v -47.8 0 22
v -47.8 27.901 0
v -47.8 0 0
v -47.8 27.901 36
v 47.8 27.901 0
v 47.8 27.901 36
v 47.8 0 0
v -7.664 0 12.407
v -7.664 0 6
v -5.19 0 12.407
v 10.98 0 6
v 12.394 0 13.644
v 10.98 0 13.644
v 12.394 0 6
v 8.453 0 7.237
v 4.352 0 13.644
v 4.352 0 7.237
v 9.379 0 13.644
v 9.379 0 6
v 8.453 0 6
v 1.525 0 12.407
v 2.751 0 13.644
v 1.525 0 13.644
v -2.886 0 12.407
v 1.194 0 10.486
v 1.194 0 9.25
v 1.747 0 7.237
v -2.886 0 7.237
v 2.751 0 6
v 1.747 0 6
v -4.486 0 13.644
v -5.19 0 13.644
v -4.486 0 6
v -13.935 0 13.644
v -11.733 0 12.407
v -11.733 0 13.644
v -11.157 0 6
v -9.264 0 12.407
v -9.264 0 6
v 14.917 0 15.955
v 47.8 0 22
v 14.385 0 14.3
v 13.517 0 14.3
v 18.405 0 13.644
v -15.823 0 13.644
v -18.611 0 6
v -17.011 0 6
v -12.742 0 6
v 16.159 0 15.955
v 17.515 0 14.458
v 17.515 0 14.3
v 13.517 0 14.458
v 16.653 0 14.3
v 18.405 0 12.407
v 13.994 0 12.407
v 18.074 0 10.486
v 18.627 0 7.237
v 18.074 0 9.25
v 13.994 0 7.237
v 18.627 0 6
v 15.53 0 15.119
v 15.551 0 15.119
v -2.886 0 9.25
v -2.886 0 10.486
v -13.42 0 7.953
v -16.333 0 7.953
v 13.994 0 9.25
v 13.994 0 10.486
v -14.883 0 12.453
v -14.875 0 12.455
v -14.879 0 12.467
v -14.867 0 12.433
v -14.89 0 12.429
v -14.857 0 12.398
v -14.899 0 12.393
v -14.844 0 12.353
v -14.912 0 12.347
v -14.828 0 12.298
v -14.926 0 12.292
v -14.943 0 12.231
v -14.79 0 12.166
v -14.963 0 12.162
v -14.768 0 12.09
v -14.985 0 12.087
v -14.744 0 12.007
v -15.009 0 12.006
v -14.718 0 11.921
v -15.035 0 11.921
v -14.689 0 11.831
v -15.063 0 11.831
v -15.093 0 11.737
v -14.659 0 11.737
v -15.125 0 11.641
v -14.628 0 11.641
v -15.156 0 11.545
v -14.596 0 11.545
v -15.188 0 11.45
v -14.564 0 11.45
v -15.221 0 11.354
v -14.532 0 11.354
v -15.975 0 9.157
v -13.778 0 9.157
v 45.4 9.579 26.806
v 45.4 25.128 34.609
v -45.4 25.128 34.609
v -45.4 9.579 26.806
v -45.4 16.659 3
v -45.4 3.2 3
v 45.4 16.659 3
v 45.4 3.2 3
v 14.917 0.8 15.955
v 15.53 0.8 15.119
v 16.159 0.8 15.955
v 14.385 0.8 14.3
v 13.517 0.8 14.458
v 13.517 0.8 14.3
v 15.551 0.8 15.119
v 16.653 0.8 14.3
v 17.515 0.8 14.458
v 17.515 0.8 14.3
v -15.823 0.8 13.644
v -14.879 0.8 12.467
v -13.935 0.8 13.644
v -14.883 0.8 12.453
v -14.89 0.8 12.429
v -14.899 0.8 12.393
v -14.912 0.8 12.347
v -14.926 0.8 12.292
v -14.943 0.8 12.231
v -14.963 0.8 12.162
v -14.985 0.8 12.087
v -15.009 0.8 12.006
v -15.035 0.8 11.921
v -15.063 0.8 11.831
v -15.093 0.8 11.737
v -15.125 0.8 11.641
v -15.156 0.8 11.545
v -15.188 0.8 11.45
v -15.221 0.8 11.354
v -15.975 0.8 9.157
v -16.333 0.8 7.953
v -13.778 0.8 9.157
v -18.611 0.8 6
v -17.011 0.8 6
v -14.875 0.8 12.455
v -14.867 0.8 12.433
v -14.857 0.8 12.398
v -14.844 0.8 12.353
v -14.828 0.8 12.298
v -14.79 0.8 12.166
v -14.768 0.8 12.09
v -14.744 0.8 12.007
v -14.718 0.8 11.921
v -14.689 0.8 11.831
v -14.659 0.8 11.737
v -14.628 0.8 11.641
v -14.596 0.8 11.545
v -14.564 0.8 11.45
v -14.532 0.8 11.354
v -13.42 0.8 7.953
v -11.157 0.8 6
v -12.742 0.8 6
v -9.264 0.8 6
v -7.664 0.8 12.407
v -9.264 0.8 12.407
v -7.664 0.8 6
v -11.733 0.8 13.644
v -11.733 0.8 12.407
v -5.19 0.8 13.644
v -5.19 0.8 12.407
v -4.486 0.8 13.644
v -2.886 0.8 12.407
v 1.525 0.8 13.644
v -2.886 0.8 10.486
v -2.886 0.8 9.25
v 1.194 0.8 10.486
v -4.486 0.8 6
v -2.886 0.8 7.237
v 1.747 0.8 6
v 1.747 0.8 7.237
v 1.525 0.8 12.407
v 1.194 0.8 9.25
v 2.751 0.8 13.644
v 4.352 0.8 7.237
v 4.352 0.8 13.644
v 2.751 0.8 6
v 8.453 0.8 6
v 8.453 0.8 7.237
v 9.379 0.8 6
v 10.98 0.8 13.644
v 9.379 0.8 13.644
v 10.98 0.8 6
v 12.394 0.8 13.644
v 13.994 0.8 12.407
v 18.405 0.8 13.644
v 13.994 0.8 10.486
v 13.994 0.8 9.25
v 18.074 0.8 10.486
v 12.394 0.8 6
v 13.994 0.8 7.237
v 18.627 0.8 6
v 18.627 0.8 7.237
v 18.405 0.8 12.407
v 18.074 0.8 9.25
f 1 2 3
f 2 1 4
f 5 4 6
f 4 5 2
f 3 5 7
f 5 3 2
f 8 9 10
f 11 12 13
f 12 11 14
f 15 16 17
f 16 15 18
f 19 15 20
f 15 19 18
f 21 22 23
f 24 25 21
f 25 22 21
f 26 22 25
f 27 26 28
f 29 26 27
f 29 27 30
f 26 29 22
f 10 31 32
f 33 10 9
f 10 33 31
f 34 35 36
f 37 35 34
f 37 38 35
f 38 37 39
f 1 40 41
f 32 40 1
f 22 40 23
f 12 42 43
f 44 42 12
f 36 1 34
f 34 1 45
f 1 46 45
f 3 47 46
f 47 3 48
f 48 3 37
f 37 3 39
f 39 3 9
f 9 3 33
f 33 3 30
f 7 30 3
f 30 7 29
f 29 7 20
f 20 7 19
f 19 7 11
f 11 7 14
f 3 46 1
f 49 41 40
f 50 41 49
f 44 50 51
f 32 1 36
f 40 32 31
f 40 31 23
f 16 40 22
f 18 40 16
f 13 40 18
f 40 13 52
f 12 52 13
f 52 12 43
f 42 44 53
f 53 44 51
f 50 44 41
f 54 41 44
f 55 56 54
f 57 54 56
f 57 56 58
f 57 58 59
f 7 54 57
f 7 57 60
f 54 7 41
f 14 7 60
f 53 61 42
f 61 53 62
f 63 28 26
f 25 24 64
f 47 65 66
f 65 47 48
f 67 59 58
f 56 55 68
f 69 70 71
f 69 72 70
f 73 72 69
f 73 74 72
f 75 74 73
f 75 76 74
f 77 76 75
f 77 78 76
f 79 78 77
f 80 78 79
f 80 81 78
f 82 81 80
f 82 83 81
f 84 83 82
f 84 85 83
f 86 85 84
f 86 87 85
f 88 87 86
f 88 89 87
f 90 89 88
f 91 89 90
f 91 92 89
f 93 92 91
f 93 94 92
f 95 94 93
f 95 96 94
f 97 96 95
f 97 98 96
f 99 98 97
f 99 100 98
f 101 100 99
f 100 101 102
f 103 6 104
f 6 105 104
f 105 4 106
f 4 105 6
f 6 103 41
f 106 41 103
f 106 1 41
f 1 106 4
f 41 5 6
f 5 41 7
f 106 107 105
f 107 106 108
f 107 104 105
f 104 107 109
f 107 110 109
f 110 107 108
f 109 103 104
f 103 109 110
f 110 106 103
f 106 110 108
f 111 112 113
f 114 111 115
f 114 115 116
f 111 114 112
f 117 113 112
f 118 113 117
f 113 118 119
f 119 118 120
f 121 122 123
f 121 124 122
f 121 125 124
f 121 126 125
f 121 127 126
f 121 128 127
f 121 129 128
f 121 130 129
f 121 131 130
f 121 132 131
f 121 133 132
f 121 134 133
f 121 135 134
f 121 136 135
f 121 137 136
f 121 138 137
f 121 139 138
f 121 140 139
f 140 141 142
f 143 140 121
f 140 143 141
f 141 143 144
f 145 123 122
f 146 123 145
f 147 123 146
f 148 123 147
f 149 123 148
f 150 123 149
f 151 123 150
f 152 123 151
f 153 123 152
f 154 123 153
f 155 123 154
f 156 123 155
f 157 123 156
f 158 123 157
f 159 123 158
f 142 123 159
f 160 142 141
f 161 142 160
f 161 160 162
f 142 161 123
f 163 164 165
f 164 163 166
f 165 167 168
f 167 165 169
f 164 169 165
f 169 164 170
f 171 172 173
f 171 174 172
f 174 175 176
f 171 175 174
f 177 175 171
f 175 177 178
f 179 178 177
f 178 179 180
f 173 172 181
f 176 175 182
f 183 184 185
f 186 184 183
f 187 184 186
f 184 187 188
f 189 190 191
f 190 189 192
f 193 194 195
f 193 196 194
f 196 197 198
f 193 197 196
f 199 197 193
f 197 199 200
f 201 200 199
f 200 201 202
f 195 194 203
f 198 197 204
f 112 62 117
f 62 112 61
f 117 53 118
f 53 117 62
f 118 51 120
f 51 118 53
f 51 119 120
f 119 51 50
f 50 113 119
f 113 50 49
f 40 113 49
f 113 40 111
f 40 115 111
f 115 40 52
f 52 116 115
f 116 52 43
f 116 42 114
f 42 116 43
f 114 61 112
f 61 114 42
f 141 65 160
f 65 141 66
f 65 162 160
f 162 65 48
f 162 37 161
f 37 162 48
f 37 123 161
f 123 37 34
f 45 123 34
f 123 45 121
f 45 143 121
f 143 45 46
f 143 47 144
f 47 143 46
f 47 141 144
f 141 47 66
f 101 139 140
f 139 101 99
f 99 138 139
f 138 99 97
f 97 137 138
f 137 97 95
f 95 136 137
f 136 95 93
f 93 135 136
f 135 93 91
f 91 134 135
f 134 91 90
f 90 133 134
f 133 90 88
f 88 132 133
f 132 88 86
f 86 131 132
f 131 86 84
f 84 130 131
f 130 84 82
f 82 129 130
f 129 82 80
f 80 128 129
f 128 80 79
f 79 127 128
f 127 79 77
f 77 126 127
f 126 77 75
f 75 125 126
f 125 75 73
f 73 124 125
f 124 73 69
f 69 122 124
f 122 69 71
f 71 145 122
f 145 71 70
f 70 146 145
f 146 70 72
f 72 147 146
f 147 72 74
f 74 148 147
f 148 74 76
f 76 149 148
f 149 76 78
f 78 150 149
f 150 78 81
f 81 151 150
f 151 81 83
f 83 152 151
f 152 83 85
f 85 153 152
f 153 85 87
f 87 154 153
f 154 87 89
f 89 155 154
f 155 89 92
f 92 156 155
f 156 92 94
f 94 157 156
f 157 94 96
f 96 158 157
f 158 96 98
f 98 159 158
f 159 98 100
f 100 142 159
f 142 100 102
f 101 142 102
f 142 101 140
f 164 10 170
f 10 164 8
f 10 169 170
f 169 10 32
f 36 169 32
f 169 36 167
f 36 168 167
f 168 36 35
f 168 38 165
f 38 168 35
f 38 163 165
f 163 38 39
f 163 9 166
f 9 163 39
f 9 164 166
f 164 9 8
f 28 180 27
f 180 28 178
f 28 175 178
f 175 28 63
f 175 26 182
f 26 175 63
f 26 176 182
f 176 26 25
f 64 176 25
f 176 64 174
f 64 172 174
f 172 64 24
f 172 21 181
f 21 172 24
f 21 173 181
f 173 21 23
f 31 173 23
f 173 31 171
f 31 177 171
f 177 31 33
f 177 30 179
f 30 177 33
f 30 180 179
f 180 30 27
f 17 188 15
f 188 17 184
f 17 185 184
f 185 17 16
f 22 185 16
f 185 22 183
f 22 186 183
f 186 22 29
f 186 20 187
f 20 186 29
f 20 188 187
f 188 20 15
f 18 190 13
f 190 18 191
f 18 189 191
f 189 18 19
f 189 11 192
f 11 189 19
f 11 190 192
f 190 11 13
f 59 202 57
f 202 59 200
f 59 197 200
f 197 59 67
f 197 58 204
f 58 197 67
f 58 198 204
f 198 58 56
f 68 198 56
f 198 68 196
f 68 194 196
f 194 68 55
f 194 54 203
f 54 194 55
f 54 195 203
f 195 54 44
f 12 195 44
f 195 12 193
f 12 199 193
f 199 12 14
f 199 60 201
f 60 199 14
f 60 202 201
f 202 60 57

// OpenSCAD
card_w   = 90;
card_h   = 50;
stack_t  = 12;
clear_w  = 0.8;
clear_t  = 1.0;
wall     = 2.4;
floor_t  = 3;
tilt     = 15;
engrave  = 0.8;
front_t  = 3.2;
front_h  = 22;
back_h   = 36;
txt      = "ATELIÊ";
txt_size = 8;
txt_z    = 6;
slot_w   = card_w + clear_w;
slot_t   = stack_t + clear_t;
slot_dy  = slot_t / cos(tilt);
tt       = tan(tilt);
body_w   = slot_w + 2*wall;
back_in  = front_t + slot_dy + (back_h - floor_t)*tt;
body_d   = back_in + wall;
top_cut  = back_h + 1;
module profile() {
    polygon([[0,0],[body_d,0],[body_d,back_h],[0,front_h]]);
}
module slot_profile() {
    polygon([
        [front_t, floor_t],
        [front_t + slot_dy, floor_t],
        [front_t + slot_dy + (top_cut - floor_t)*tt, top_cut],
        [front_t + (top_cut - floor_t)*tt, top_cut]
    ]);
}
module extrude_x(len) {
    rotate([90,0,90]) linear_extrude(height = len) children();
}
difference() {
    translate([-body_w/2, 0, 0]) extrude_x(body_w) profile();
    translate([-slot_w/2, 0, 0]) extrude_x(slot_w) slot_profile();
    translate([0, engrave, txt_z])
        rotate([90,0,0])
            linear_extrude(height = engrave + 0.2)
                text(txt, size = txt_size, font = "Liberation Sans:style=Bold",
                     halign = "center", valign = "baseline");
}
echo(str("Width (X): ", body_w, " mm"));
echo(str("Depth (Y): ", body_d, " mm"));
echo(str("Height (Z): ", back_h, " mm"));
